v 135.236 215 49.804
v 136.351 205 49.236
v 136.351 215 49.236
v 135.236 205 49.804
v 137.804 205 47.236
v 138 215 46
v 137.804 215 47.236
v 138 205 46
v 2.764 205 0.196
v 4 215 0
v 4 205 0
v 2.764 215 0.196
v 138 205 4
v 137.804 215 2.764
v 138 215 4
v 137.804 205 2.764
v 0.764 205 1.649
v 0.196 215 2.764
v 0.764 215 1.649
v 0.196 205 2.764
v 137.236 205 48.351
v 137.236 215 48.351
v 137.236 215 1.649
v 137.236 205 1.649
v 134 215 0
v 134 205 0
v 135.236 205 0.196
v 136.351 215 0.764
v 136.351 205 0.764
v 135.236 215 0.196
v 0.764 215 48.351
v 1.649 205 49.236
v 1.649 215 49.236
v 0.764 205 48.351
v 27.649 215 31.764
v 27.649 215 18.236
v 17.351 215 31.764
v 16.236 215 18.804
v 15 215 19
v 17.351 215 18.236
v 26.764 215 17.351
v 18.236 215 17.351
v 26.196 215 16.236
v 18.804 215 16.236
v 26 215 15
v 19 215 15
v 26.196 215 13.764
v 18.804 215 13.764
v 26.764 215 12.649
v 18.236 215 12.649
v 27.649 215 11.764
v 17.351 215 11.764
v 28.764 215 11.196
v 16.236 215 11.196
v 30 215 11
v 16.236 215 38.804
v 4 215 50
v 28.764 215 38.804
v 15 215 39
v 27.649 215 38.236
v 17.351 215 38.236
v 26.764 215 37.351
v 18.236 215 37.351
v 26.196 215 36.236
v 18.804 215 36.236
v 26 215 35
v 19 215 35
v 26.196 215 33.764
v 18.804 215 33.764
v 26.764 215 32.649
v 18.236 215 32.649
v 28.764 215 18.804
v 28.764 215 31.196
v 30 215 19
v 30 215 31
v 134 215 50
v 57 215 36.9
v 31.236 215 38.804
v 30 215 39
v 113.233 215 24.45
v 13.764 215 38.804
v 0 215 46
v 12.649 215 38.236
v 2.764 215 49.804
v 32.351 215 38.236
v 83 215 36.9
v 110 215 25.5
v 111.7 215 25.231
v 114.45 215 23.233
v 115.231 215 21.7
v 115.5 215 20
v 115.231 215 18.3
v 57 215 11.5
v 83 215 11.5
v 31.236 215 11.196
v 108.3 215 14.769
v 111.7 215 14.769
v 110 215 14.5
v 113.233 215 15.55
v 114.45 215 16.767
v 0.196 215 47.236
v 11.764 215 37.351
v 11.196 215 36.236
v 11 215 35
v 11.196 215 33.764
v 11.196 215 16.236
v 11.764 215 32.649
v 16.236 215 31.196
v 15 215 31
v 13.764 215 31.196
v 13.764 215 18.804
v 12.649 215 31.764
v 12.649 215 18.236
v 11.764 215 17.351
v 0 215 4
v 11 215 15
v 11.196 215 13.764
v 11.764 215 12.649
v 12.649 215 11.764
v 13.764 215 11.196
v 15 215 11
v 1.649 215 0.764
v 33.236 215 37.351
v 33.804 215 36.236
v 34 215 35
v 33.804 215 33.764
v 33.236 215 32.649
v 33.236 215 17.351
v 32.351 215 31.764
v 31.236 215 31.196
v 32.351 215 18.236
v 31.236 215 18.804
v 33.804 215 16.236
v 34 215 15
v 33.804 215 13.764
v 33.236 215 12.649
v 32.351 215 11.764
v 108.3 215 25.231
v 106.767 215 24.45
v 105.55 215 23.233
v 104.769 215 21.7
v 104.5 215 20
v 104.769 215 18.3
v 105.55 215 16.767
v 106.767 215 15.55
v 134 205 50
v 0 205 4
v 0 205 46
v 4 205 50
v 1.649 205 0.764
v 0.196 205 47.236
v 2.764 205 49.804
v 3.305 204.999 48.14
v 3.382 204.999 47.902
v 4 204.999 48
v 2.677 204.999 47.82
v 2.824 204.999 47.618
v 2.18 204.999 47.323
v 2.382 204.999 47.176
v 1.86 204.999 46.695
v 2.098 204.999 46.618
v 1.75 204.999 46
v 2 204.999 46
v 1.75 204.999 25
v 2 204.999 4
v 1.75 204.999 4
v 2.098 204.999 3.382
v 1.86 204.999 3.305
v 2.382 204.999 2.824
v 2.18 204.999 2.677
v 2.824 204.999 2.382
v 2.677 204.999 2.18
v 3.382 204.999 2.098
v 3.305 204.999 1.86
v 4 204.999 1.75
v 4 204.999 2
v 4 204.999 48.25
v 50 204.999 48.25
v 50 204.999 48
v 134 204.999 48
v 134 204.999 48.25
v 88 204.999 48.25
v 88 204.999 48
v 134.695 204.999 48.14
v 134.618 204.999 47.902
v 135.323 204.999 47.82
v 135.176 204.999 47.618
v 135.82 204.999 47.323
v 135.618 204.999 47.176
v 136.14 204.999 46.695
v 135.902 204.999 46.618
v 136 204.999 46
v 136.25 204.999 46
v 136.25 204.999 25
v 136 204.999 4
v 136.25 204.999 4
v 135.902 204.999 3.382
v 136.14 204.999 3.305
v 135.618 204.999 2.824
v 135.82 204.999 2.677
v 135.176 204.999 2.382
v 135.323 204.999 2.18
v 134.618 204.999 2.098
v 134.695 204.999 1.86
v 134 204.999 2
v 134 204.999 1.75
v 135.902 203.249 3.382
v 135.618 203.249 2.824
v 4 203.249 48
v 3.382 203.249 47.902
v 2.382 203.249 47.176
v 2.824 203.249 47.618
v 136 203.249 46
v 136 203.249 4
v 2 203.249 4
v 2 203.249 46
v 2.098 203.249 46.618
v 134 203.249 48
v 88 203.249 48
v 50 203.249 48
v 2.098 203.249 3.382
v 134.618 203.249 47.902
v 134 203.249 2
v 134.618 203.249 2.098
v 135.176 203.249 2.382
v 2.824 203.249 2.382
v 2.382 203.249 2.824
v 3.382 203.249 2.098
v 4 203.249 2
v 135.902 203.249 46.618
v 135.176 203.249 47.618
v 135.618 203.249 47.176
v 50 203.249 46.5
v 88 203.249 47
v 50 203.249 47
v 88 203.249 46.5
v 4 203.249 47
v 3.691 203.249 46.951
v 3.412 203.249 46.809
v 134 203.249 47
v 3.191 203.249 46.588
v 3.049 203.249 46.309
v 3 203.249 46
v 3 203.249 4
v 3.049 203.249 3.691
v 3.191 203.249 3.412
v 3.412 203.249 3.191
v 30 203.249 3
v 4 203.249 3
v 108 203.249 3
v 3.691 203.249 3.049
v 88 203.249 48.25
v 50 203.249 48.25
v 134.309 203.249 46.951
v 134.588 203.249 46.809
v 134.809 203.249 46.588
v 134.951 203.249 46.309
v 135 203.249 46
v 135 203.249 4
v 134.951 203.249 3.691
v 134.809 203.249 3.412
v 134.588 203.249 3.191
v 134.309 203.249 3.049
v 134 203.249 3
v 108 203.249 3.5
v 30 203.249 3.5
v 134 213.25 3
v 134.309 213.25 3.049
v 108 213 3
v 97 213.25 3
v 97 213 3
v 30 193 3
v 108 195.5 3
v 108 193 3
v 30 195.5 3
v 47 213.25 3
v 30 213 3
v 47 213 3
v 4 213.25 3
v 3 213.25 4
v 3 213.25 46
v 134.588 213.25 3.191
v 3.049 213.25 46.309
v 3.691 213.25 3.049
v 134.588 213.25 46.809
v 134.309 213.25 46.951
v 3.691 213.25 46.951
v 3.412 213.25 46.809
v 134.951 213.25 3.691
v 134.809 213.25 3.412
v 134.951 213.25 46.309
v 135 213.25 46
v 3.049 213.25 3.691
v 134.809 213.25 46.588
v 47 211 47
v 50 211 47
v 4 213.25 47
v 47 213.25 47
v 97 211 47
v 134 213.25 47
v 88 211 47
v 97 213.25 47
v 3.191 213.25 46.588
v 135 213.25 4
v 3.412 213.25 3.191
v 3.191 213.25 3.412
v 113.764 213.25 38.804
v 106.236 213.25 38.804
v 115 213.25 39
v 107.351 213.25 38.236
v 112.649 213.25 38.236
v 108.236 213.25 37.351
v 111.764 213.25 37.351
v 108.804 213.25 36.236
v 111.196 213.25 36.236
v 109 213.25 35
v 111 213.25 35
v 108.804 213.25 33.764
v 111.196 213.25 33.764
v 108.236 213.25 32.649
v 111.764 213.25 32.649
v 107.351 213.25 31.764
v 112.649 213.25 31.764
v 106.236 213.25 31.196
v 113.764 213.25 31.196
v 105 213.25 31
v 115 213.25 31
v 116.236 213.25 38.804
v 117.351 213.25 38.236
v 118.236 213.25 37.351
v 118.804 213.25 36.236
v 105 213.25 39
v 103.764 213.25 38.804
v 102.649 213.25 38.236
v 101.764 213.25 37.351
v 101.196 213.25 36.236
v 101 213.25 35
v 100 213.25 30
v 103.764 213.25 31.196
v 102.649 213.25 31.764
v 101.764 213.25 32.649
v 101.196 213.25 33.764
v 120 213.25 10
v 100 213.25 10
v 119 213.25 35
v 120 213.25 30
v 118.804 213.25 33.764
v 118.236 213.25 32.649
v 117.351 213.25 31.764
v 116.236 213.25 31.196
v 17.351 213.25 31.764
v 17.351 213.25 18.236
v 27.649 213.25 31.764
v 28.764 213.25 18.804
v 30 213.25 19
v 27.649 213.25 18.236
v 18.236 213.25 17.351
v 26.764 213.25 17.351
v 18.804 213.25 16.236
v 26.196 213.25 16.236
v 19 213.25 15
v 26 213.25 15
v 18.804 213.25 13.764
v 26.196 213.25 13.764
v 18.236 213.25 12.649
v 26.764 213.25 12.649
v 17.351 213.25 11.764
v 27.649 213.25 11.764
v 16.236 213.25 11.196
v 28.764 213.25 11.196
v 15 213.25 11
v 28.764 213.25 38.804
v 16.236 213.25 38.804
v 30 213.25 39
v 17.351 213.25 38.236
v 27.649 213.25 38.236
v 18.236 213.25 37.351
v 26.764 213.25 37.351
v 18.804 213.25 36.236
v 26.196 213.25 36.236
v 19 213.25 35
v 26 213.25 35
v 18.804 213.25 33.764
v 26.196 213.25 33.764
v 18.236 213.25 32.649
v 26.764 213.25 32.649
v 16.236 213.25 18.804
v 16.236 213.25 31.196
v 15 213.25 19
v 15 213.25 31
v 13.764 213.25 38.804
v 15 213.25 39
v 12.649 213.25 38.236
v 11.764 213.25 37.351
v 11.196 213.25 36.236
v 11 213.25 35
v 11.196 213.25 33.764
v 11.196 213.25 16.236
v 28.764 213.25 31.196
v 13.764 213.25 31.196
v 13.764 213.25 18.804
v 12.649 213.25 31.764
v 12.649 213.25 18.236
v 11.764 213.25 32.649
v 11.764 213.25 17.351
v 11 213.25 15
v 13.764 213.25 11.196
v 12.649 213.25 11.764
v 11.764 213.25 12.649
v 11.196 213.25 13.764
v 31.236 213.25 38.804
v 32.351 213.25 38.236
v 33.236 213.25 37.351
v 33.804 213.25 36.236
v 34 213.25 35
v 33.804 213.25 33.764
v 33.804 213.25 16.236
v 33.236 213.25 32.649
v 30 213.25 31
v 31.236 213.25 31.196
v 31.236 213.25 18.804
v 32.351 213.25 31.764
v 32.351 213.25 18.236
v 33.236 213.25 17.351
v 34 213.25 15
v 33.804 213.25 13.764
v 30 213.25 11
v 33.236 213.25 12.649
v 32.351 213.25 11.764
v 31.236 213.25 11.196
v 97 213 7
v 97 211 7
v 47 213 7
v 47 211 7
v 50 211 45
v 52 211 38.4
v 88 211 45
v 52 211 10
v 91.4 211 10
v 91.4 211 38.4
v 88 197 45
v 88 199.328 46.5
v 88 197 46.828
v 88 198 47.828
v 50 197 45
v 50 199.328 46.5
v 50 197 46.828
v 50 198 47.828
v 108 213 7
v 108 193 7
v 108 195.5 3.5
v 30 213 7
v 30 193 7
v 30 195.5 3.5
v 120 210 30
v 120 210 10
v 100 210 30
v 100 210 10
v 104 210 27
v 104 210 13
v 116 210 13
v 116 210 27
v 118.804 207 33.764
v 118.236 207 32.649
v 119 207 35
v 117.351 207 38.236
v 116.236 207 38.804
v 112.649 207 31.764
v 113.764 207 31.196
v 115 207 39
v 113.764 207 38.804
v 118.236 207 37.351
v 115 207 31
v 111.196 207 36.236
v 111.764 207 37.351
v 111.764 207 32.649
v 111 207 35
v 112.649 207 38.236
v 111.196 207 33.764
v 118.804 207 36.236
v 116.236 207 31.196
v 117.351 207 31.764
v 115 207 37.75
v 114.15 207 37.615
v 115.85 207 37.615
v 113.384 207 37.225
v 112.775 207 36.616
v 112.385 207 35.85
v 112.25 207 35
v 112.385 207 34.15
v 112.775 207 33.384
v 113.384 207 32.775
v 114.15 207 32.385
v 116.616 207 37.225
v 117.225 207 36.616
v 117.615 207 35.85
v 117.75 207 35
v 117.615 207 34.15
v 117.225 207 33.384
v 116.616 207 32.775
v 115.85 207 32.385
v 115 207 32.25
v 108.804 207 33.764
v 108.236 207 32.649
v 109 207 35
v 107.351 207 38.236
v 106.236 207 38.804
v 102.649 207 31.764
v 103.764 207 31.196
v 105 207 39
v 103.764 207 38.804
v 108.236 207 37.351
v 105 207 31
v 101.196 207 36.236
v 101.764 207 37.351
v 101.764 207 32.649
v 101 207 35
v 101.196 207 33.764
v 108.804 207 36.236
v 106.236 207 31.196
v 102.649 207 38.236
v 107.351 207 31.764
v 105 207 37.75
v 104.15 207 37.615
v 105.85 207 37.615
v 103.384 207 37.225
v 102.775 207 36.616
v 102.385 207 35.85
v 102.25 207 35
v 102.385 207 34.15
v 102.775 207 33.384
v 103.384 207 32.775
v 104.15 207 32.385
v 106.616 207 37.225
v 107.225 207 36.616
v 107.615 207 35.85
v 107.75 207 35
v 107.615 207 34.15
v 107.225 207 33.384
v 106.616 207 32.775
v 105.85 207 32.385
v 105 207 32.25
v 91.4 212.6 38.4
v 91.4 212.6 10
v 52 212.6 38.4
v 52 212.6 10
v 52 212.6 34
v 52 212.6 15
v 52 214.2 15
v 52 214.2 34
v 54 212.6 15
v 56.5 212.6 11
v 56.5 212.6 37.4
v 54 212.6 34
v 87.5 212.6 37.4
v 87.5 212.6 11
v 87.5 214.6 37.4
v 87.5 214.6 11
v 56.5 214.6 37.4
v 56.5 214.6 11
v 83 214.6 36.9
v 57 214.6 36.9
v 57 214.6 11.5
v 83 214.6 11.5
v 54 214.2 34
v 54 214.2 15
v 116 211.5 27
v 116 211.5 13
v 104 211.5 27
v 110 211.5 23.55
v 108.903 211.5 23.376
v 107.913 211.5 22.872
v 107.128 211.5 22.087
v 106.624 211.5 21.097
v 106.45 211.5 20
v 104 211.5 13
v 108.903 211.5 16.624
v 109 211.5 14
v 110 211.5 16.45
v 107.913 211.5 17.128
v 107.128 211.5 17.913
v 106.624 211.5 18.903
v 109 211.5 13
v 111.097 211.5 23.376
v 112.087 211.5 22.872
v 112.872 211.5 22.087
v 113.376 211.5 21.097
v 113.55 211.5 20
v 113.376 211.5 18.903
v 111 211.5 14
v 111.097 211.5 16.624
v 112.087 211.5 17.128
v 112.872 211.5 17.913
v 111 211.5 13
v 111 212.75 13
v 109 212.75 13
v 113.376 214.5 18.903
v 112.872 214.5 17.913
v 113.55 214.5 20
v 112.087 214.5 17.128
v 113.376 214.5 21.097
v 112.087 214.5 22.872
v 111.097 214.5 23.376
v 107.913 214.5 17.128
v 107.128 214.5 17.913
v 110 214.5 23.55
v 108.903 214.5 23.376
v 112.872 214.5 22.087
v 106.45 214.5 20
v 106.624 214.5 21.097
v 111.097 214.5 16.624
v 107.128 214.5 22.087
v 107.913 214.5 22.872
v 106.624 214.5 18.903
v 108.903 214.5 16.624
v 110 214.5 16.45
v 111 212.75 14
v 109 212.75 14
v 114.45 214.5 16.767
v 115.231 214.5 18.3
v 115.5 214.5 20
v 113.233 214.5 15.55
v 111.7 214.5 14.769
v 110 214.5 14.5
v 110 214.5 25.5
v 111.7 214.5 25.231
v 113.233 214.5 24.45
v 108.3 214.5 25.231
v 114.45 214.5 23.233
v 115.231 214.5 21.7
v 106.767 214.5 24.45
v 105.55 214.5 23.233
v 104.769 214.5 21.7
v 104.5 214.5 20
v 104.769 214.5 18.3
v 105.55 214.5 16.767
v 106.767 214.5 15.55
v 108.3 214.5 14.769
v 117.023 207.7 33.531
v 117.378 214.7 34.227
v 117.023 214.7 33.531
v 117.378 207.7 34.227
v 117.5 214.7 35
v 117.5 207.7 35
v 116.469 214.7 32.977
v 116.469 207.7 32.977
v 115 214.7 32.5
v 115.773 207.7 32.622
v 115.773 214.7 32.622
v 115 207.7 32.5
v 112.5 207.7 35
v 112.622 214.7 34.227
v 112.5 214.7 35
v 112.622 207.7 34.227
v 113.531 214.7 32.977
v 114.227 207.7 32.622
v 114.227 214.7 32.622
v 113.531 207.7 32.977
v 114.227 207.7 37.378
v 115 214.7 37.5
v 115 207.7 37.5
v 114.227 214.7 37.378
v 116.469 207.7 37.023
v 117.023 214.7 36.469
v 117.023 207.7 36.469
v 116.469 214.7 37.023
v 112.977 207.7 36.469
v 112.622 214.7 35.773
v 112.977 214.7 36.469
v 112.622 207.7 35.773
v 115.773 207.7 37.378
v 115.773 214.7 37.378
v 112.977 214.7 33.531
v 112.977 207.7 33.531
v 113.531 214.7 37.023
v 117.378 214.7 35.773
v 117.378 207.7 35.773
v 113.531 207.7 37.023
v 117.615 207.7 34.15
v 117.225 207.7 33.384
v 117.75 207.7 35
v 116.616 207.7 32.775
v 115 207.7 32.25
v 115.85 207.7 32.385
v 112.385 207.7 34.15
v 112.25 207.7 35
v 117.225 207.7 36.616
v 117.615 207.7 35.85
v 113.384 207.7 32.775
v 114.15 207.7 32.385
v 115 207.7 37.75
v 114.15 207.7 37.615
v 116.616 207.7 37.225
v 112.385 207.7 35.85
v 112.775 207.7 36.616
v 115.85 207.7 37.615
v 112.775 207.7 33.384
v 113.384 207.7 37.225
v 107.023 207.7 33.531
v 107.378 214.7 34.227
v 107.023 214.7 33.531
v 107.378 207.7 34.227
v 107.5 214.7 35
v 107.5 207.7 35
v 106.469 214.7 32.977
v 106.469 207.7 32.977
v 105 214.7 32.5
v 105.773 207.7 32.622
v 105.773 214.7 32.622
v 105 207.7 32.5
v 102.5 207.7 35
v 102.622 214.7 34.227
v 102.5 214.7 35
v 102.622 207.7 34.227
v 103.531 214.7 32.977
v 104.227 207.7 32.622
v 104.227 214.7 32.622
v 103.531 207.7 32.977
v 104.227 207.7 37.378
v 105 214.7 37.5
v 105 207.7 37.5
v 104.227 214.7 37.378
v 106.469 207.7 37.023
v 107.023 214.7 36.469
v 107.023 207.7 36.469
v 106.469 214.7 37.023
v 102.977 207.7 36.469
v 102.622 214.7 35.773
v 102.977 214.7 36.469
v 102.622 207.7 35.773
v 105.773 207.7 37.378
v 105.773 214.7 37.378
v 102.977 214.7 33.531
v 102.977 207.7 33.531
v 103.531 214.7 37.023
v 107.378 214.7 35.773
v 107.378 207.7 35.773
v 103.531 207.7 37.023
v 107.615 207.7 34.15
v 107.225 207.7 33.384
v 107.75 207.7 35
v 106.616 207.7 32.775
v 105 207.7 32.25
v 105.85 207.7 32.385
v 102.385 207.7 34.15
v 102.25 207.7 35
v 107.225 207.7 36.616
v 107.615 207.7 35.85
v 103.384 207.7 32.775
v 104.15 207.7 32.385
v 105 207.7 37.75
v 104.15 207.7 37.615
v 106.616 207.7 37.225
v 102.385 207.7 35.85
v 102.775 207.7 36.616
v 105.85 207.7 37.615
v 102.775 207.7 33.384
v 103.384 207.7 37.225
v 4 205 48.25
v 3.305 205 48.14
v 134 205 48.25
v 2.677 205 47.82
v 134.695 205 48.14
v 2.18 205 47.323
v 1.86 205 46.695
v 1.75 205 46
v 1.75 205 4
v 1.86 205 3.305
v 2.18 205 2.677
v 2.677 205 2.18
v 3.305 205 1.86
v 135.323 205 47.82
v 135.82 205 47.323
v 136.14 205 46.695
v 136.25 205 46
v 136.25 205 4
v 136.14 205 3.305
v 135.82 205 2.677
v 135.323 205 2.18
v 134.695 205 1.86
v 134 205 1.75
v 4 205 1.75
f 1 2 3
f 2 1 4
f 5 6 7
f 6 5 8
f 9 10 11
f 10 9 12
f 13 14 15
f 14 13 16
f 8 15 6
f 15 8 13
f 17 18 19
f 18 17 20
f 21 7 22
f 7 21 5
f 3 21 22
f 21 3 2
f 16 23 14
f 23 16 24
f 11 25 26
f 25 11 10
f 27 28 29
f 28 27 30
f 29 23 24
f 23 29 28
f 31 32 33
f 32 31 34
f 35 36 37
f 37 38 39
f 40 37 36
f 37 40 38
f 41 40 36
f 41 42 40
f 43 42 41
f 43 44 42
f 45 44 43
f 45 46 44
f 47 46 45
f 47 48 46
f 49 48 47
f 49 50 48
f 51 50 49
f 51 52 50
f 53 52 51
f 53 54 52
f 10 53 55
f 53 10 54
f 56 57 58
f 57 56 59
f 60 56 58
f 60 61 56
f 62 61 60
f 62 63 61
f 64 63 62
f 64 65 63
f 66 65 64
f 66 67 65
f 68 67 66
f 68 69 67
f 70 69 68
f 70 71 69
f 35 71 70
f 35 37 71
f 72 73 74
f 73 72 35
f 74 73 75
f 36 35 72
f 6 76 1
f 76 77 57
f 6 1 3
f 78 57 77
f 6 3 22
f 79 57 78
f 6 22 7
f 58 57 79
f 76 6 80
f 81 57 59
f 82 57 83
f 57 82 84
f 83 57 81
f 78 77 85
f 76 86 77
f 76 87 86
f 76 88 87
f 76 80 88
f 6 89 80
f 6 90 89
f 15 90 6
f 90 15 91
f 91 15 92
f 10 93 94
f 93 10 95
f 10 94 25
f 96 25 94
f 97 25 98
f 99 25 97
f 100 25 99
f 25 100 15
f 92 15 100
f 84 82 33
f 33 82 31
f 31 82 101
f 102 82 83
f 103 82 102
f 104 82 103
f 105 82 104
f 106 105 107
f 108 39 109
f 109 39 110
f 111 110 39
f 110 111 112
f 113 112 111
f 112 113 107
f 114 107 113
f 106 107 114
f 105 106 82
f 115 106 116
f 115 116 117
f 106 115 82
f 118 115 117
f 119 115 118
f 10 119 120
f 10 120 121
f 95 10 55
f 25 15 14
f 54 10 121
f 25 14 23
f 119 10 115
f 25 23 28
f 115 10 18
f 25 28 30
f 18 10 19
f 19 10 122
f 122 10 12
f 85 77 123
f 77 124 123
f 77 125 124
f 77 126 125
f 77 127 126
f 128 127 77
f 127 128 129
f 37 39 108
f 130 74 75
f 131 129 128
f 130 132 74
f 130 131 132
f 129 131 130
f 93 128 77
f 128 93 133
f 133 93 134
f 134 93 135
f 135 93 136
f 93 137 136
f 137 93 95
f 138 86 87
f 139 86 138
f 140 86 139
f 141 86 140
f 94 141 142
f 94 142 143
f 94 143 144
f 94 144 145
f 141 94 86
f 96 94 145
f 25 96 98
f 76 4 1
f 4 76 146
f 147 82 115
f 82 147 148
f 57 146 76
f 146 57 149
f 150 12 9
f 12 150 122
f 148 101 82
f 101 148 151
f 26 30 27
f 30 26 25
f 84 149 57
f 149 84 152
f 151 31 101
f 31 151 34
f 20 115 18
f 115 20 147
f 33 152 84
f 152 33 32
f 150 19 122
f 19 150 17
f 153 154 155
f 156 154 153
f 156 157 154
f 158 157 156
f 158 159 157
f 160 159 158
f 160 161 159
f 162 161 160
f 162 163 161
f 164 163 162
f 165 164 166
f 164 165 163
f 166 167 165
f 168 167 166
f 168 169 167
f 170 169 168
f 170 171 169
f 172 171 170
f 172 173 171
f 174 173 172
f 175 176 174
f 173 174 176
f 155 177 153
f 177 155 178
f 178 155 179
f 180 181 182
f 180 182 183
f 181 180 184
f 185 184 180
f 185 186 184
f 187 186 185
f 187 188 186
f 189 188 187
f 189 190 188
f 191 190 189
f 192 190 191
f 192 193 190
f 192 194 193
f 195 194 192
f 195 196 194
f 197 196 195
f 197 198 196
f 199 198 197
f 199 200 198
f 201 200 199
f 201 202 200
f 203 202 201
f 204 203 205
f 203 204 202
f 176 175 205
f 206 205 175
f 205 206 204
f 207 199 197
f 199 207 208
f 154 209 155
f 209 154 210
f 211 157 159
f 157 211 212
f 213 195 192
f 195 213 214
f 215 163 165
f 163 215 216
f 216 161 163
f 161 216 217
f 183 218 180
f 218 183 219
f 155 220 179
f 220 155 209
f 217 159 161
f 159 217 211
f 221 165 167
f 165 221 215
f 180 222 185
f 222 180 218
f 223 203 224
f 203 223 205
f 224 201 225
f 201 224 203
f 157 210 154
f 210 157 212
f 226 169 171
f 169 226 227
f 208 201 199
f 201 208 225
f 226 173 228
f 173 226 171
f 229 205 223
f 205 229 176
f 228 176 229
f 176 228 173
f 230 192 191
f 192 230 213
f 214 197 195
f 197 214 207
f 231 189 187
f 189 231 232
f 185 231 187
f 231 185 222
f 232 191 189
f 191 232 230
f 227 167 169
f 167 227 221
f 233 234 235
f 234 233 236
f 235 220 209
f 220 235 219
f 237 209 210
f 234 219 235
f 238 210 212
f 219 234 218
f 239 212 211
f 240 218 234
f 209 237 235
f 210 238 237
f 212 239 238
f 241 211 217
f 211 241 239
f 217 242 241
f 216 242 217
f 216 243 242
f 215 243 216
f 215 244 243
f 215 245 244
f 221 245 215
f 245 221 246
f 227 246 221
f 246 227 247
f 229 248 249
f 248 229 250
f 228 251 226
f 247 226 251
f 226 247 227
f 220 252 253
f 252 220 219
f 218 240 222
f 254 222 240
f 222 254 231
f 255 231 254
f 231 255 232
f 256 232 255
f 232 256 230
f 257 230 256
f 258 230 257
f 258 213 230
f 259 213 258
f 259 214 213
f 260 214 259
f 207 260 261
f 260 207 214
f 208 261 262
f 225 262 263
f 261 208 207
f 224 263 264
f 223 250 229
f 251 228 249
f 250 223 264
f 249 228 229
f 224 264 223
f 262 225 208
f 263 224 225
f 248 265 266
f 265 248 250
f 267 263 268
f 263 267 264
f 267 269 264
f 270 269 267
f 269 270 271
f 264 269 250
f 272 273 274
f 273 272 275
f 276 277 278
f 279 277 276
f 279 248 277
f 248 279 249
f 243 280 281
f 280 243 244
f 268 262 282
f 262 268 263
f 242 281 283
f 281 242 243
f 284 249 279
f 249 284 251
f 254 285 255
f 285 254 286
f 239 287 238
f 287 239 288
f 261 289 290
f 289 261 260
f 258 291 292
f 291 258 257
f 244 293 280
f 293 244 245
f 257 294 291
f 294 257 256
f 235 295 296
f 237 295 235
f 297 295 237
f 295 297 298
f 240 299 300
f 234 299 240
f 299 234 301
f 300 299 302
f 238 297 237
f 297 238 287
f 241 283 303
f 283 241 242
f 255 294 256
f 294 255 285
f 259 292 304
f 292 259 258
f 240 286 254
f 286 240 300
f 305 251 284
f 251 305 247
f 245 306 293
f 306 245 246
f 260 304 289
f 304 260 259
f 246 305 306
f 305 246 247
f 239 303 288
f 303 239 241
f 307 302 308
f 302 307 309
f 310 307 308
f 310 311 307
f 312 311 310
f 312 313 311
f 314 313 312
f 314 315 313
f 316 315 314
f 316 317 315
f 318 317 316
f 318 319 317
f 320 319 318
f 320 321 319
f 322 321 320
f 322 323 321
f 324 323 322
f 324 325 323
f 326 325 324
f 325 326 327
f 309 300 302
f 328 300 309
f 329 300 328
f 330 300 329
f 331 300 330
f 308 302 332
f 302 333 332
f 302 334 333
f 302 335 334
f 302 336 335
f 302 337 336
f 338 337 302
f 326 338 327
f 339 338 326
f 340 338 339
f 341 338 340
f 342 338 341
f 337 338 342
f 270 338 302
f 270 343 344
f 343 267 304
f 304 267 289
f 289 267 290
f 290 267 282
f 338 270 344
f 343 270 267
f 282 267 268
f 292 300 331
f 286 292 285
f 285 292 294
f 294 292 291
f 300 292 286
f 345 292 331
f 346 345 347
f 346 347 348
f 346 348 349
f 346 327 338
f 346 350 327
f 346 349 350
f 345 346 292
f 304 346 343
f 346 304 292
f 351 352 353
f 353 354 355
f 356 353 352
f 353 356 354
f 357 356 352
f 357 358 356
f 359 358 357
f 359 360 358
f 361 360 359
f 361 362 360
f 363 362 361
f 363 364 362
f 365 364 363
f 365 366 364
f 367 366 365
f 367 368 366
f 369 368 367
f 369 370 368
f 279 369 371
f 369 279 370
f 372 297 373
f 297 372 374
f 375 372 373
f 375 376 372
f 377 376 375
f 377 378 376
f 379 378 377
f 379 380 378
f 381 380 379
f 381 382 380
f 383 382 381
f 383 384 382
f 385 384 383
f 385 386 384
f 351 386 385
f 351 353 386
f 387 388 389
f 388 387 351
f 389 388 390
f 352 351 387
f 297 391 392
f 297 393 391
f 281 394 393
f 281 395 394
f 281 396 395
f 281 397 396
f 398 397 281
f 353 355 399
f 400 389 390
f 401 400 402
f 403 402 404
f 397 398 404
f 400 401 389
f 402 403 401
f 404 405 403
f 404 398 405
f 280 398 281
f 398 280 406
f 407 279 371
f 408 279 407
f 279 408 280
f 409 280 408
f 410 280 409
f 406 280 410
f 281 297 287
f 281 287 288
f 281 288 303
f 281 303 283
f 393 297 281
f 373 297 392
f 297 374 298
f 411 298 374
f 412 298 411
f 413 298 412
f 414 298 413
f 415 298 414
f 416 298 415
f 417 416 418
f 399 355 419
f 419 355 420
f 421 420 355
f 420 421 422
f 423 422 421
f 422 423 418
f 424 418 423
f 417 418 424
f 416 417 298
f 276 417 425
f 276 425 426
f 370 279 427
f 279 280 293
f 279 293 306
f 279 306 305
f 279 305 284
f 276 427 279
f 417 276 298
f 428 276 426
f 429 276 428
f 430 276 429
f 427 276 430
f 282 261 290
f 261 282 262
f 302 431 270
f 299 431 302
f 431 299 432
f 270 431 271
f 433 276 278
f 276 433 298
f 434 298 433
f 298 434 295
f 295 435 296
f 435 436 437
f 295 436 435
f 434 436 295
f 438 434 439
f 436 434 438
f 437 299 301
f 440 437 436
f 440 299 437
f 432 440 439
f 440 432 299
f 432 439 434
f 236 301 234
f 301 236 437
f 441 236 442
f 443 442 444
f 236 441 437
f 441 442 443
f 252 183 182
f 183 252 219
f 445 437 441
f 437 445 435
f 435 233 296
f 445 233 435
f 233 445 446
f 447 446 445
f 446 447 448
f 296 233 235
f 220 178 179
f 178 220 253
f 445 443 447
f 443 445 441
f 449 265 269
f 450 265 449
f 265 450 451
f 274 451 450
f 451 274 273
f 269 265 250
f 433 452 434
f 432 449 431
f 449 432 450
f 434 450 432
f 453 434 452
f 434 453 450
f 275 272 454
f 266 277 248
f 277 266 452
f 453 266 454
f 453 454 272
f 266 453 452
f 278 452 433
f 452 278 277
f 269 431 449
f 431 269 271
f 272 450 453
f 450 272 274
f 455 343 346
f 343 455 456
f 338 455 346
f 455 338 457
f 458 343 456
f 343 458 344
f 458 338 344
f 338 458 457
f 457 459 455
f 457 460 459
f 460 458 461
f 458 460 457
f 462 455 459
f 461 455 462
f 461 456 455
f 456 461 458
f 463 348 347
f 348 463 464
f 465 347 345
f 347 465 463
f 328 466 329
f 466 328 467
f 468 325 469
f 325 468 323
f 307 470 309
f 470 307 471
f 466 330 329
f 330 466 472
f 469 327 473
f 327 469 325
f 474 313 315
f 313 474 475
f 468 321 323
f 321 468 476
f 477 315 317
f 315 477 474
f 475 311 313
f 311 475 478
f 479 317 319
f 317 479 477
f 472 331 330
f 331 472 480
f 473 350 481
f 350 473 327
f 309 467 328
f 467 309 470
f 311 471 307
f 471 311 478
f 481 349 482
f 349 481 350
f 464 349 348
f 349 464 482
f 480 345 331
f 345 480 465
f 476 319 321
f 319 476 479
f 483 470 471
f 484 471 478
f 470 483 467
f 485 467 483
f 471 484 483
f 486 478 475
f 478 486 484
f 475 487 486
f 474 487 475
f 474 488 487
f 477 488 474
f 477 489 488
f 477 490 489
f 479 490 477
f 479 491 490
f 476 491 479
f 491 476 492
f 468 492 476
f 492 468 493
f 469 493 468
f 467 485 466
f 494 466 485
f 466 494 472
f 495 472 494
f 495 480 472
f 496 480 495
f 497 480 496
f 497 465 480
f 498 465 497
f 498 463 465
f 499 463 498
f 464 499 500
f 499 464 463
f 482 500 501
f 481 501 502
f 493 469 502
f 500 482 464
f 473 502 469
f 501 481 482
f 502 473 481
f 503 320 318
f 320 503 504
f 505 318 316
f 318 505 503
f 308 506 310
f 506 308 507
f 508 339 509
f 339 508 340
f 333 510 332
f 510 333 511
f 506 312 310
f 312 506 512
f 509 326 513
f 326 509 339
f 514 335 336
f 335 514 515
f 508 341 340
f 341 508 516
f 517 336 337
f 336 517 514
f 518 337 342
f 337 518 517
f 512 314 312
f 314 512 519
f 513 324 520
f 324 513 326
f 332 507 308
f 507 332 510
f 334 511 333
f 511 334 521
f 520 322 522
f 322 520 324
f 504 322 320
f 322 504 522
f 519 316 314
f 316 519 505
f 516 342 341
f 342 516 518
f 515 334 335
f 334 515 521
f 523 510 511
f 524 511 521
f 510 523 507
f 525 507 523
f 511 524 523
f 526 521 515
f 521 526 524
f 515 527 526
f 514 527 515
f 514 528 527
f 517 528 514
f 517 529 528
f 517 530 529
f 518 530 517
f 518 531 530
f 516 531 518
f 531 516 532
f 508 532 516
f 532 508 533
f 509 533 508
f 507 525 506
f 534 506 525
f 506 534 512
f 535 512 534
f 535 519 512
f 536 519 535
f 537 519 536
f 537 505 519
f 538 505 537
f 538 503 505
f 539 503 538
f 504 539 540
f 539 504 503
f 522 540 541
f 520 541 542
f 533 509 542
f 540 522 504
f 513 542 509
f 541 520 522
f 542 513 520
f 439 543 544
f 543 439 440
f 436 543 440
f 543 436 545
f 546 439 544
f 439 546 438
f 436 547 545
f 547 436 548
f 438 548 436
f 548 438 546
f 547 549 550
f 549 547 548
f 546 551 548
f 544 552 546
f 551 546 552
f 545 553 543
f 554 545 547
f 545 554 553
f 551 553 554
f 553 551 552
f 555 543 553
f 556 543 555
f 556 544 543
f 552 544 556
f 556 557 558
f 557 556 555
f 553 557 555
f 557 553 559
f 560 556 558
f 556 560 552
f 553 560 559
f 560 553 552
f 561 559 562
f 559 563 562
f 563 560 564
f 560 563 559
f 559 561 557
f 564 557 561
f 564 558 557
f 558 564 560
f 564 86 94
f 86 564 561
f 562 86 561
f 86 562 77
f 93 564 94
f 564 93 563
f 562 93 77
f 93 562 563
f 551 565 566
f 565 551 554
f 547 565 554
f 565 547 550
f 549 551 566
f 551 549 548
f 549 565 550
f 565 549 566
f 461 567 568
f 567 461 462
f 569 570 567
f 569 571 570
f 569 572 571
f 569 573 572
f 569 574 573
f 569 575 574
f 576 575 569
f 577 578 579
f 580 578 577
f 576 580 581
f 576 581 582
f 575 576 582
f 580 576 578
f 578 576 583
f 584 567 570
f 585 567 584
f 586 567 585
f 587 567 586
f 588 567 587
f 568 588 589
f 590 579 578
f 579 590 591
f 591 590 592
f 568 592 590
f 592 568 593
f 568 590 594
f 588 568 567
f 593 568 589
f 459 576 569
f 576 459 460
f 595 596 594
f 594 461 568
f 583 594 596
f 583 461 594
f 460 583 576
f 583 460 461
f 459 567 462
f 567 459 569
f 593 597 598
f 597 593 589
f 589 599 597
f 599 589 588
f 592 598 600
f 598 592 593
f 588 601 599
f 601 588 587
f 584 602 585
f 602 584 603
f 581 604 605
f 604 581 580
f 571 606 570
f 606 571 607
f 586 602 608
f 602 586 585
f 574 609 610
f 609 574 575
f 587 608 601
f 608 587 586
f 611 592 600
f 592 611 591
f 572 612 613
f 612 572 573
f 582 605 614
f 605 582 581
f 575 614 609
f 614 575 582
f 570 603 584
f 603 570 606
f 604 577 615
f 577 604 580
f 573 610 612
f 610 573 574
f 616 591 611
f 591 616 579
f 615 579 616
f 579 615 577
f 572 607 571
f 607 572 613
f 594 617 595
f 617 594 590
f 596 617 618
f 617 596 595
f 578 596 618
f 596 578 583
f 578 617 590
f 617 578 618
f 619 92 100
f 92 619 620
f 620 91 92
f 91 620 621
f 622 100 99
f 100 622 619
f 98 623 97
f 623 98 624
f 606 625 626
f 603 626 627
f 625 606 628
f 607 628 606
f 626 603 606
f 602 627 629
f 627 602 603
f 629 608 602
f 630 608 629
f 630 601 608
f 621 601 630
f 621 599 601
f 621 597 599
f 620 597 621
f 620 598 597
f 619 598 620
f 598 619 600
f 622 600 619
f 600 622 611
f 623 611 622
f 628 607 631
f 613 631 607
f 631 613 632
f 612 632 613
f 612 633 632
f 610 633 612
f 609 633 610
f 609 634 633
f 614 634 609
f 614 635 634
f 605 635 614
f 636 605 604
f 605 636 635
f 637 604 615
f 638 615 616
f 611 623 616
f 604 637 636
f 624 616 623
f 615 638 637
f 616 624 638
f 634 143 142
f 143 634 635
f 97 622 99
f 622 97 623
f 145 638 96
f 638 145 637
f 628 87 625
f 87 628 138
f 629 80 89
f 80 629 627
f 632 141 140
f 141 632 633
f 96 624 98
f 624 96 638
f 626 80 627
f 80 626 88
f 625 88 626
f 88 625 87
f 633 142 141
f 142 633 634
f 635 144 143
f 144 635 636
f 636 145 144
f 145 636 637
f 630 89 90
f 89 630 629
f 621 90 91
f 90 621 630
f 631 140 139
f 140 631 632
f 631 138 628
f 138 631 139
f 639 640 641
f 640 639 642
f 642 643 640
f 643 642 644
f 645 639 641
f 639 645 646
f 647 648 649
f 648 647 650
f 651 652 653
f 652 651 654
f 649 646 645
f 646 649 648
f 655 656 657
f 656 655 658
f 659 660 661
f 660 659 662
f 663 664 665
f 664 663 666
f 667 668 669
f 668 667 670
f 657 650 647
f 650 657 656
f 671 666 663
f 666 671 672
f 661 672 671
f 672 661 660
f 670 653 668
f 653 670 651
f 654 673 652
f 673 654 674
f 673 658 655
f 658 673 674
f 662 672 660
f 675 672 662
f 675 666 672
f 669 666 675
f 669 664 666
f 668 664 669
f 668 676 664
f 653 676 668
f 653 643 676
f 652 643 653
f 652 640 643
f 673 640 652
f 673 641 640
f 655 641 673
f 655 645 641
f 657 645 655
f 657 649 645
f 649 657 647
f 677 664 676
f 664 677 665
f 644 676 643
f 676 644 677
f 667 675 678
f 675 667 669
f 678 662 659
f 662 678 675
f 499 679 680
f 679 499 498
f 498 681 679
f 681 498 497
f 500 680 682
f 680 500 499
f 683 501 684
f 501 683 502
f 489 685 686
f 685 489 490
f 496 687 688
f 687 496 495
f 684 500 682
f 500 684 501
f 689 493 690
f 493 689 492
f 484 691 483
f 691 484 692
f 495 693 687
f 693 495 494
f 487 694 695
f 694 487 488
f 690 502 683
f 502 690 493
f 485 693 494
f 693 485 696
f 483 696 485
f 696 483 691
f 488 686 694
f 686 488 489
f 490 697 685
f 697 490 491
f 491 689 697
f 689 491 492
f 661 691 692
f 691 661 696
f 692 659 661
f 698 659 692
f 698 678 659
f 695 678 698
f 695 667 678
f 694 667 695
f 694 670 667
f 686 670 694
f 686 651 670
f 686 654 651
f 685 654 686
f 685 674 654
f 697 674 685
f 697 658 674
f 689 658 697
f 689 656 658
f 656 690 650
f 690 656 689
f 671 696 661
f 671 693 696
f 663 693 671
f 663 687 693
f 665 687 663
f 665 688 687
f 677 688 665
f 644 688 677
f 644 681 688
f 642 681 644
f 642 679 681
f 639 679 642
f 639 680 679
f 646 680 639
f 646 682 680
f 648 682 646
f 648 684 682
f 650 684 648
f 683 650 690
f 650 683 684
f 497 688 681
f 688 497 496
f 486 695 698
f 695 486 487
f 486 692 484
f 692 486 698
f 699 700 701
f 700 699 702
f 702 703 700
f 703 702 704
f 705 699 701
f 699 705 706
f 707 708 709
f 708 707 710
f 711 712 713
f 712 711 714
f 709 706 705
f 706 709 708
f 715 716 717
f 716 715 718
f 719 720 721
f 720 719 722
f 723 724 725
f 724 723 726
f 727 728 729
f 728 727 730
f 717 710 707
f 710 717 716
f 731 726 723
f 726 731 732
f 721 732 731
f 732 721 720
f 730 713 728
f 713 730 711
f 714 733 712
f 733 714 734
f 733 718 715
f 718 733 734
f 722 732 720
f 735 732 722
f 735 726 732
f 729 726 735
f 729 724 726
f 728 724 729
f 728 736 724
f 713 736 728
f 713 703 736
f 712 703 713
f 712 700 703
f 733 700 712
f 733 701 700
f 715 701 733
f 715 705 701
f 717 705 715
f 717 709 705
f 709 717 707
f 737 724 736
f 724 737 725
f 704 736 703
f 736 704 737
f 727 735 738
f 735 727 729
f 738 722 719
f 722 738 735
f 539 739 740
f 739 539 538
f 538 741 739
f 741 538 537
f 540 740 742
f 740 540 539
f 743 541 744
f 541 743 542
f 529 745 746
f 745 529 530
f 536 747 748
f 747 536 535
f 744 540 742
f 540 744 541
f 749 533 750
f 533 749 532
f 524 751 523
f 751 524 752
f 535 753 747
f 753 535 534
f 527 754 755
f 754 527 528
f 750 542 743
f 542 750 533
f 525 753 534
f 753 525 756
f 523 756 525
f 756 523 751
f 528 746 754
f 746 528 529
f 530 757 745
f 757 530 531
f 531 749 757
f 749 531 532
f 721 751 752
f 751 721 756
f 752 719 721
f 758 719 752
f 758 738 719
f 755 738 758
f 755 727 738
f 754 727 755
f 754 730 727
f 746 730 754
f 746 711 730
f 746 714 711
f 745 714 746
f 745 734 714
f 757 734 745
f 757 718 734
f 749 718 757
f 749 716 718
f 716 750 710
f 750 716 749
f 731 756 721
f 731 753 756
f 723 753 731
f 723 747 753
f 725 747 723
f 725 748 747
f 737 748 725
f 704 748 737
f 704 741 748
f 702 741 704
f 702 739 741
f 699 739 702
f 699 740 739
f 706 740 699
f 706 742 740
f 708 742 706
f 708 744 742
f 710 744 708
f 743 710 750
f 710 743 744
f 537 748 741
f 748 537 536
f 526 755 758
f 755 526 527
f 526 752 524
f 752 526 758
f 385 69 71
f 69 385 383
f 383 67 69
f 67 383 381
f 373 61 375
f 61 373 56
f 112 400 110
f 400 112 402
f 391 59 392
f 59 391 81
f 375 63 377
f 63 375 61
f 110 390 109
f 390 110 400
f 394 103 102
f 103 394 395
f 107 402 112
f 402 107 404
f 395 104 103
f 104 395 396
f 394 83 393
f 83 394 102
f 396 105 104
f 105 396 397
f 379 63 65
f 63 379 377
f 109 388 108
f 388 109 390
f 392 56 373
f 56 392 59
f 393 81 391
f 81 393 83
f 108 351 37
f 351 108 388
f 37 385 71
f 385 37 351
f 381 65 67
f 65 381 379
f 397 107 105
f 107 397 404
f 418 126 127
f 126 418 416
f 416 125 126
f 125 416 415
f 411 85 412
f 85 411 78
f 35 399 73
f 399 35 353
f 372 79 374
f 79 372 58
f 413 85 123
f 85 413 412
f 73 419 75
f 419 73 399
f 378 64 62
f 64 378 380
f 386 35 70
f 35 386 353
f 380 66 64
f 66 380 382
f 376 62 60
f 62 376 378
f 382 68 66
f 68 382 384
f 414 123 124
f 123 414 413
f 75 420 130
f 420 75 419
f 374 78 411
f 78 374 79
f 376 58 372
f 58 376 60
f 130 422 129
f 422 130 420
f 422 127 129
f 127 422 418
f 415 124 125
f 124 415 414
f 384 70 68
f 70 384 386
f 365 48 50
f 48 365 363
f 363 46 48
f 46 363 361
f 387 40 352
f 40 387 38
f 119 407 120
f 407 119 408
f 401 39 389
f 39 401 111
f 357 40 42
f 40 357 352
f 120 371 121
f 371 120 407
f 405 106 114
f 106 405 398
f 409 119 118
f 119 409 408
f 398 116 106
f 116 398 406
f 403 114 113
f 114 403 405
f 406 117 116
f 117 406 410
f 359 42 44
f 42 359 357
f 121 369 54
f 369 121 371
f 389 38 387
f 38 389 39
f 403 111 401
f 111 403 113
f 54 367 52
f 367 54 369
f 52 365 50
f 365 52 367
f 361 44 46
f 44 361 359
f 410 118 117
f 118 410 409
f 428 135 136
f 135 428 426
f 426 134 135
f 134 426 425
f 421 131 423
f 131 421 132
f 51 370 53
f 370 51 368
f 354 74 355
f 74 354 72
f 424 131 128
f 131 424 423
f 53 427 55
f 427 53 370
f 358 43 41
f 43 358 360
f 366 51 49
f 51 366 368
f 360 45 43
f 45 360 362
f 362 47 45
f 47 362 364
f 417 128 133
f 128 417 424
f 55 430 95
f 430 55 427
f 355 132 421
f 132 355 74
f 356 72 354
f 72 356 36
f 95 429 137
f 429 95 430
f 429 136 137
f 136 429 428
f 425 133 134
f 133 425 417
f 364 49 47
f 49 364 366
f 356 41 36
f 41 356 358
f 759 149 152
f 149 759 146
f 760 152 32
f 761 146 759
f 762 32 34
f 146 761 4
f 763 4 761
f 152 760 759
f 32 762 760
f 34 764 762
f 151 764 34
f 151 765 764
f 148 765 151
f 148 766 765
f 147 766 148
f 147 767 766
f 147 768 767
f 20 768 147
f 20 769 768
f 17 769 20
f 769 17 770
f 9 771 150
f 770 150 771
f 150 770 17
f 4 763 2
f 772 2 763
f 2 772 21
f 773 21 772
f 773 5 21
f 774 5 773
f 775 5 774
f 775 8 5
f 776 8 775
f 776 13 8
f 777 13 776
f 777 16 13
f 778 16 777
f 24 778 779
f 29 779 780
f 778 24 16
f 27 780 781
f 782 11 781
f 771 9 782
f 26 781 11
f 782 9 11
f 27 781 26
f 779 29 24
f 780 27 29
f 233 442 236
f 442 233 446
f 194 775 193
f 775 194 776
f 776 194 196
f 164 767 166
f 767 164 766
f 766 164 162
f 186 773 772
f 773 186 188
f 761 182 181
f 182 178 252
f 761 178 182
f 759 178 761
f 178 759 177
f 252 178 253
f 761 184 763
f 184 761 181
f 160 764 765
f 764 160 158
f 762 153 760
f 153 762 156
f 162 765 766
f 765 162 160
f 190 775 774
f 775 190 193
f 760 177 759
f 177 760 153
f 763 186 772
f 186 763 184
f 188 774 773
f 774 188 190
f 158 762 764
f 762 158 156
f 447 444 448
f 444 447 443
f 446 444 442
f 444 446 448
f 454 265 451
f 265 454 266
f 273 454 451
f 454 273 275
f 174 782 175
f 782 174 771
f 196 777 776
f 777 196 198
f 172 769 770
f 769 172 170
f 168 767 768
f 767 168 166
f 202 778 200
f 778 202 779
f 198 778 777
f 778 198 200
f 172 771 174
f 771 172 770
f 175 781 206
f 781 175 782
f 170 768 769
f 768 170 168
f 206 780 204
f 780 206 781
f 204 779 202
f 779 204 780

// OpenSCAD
// file: PiHoles.scad
//Shut your Pi Hole!
//An OpenSCAD library to assist with designing Raspberry Pi accessories

//This work is licensed under the Creative Commons Attribution-ShareAlike 4.0 International License. To view a copy of this license, visit http://creativecommons.org/licenses/by-sa/4.0/.
//© 2016 Dale Price

//Pi dimensions sourced from https://www.raspberrypi.org/documentation/hardware/raspberrypi/mechanical/
//Currently supports "1B", "1A+", "1B+", "2B", "3B", "Zero"

//get vector of [x,y] vectors of locations of mounting holes based on Pi version
function piHoleLocations (board="3B") =
	(board=="1A+" || board=="1B+" || board=="2B" || board=="3A+" || board=="3B") ?
		[[3.5, 3.5], [61.5, 3.5], [3.5, 52.5], [61.5, 52.5]] : //pi 1B+, 2B, 3B
	(board=="Zero") ?
		[[3.5, 3.5], [61.5, 3.5], [3.5, 26.5], [61.5, 26.5]] : //pi zero
	(board=="1B") ?
		[[80, 43.5], [25, 17.5]] :
	[]; //invalid board

//get vector of [x,y,z] dimensions of board
//	dimensions are for PCB only, not ports or anything else
function piBoardDim (board="3B") =
	(board=="1B" || board=="1B+" || board=="2B" || board=="3B") ?
		[85, 56, 1.25] :
	(board=="Zero") ?
		[65, 30, 1.25] :
	(board == "1A+" || board=="3A+") ?
		[65, 56, 1.25] :
	[0,0,0];

//Mounting holes for a Raspberry Pi of the specified version
//	Parameters
//		board: the version of the raspberry pi to generate holes for
//		depth: the depth of the holes in mm
module piHoles (board, depth = 5, preview=true) {
	hd = 2.8; //radius of pi mounting holes plus a tiny bit extra to account for shrinkage when 3D printing
	hr = hd/2;

	//preview of the board itself
	if(preview==true)
		% piBoard(board);

	//mounting holes
	for(holePos = piHoleLocations(board)) {
		translate([holePos[0], holePos[1], -depth]) cylinder(d=hd, h=depth);
	}
}

//Preview of board dimensions for Raspberry Pi of the specified version
module piBoard (board) {
	difference() {
		cube(piBoardDim(board), center=false);
		translate([0,0,piBoardDim(board)[2] + 0.01]) piHoles(board, piBoardDim(board)[2] + 0.02, false);
	}

	//warn about possible inaccuracy of boards that don't currently have official documentation
	if(board == "1B") {
		echo("CAUTION: The mounting hole positions for the board you have selected may not be accurate because the Raspberry Pi Foundation does not currently provide official mechanical drawings for it.");
	}
}

//Snap-fit posts for mounting the Raspberry Pi
//	Parameters
//		board: version of the raspberry pi to mount
//		height: height of the top surface of the raspberry pi board off the base of the posts
//		preview: whether or not to show a preview of the board in place
module piPosts(board, height=5, preview=true) {
	piSize = piBoardDim(board);
	piHolePos = piHoleLocations(board);

	module pcbPost(height) {
		cylinder(d1=10, d2=5, h=height - piSize[2] - 0.25);
	}

	for(holePos = piHolePos) {
		translate([holePos[0], holePos[1], 0]) pcbPost(height);
	}

	if(preview==true)
		% translate([0,0,height-piSize[2]]) piBoard(board);
}
// main file
include <PiHoles.scad>;

$fn=20;

facePi1541();
//lidPi1541();
//basePi1541();



module screwpost() {
    difference() {
        union() {
            translate([0,-5,0]) cube([10,10,50]);
            cylinder(d=10,h=50);
        }
        cylinder(d=2.5,h=50);
    }
}

regPos=[95,20,-10];


module basePi1541() {   
    difference() {
        union() {
            roundedBoxBottom();
            translate([10,0,-12]) cube([57,8,36]);
            translate([2,0,2]) cube([57,8,36-14]);
            translate([80,20,-10]) rotate([0,0,90]) piPosts("3B",9,false); 
            
            translate(regPos) { 
                translate([3,6,0]) cylinder(d1=10, d2=5, h=10);
                translate([18,37,0]) cylinder(d1=10, d2=5, h=10);
            }
        }
        translate([35,3.5,0]) rotate([90,0,180]) ieccut();
        translate([35+25,3.5,0]) rotate([90,0,180]) ieccut();
        translate([90,-5,15]) rotate([-90,0,0]) cylinder(d=6,h=20);
        translate([110,-5,15]) rotate([-90,0,0]) cylinder(d=8,h=20);
        translate([90-8.5/2,3,8]) cube([8.5,10,14]);
        translate([80,20,0]) rotate([0,0,90]) piHoles("3B",9,false);
        translate(regPos) { 
            translate([3,6,0]) cylinder(d=2.5, h=20);
            translate([18,37,0]) cylinder(d=2.5, h=20);
        }
    }
}

module lidPi1541() {
    roundedBoxTop();

}

module facePi1541() {
    difference() {
        translate([0,205,0]) difference() {
            union() {
                roundedBoxFace();
                translate([47,6,0]) cube([50,4,50]);
                translate([50,-8,45]) cube([38,15,4]);
                translate([30,-12,3]) cube([78,20,4]);
                translate([110,7,20]) cube([20,4,20],center=true);
                translate([115,2,35]) rotate([-90,0,0]) cylinder(d=8,h=8);
                translate([105,2,35]) rotate([-90,0,0]) cylinder(d=8,h=8);
            }
            translate([52,6,10]) spiLCD();
            translate([110,3,20]) rotate([-90,0,0]) rotaryEncoder();
            translate([115,1.7,35]) rotate([-90,0,0]) LED();
            translate([105,1.7,35]) rotate([-90,0,0]) LED();
            translate([15,2,35]) rotate([-90,0,0]) cylinder(d=8,h=18);
            translate([30,2,35]) rotate([-90,0,0]) cylinder(d=8,h=18);
            translate([15,2,15]) rotate([-90,0,0]) cylinder(d=8,h=18);
            translate([30,2,15]) rotate([-90,0,0]) cylinder(d=8,h=18);

        }
        lidPi1541();
        basePi1541();
    }
}

module LED() {
    cylinder(d=5,h=8);
    cylinder(d=5.5,h=1);
}

module spiLCD() {    
    cube([39.4,1.6,28.4]);
    translate([4.5,1.6,1]) cube([31,2,26.4]);
    translate([5,1.6+2,1.5]) cube([26,12,25.4]);
    translate([0,1.6,5]) cube([2,1.6,19]);
}

module rotaryEncoder() {
    cube([12,14,7],center=true);
    cylinder(d=7.1,h=20);
    translate([0,7-0.5,7/2+0.5]) cube([2,1,1.5],center=true);
    translate([0,0,7/2+3]) cylinder(d=11,h=20);
}


module roundedBoxFace(d=8,s=[138,205,50],w=7) {

    difference() {
        union() {
            translate([d/2,0,d/2]) minkowski() {
                cube([s[0]-d,10,s[2]-d]);
                rotate([90,0,0]) cylinder(d=d,h=0.001);
            }
            translate([d/2,-w/4,d/2]) minkowski() {
                cube([s[0]-d,10,s[2]-d]);
                rotate([90,0,0]) cylinder(d=d/2,h=0.001);
            }
        }
        translate([d/2,-w/4,d/2]) minkowski() {
            cube([s[0]-d,10,s[2]-d]);
            rotate([90,0,0]) cylinder(d=d/4,h=0.001);
        }
    }
}


module roundedBoxTop(d=8,s=[138,205,50],w=7) {

    difference() {
        translate([d/2,0,d/2]) minkowski() {
            cube([s[0]-d,s[1],s[2]-d]);
            rotate([90,0,0]) cylinder(d=d,h=0.001);
        }
        translate([d/2,w/2+10,d/2]) minkowski() {
            cube([s[0]-d,s[1],s[2]-d]);
            rotate([90,0,0]) cylinder(d=d-w,h=10);
        }
        translate([0,-1,0]) cube([s[0]+20+d,s[1]+20+d,s[2]/2]);
        translate([w/4,w/4,s[2]/2-2]) cube([s[0]-w/2,s[1],4]);
        for (i=[0:6:80]) {
            translate([-0.1,40+i,s[2]/2+d/2]) cube([s[0]+10,2,(s[2]/2)-d]);
        }
        translate([d/2,s[1]-w/4,d/2]) minkowski() {
            cube([s[0]-d,10,s[2]-d]);
            rotate([90,0,0]) cylinder(d=d-w/2,h=0.001);
        }
        translate([138/2,198,45]) rotate([45,0,0]) cube([40,4,4],center=true);

    }
    difference() {
        intersection() {
            union() {
                translate([128,20,25]) screwpost();
                translate([128,180,25]) screwpost();
                translate([10,20,25]) rotate([0,0,180]) screwpost();
                translate([10,180,25]) rotate([0,0,180]) screwpost();
            }
            translate([d/2,0,d/2]) minkowski() {
                cube([s[0]-d,s[1],s[2]-d]);
                rotate([90,0,0]) cylinder(d=d,h=0.001);
            }
        }
        roundedBoxBottom();
    }
}

module roundedBoxBottom(d=8,s=[138,205,50],w=7) {
    difference() {
        union() {
            difference() {
                union() {
                    intersection() {
                        translate([d/2,0,d/2]) minkowski() {
                            cube([s[0]-d,s[1],s[2]-d]);
                            rotate([90,0,0]) cylinder(d=d,h=0.001);
                        }
                        translate([0,-1,0]) cube([s[0]+20+d,s[1]+20+d,s[2]/2]);
                    }
                    base();
                    translate([w/4,w/4,s[2]/2-2]) cube([s[0]-w/2,s[1]-w/2,4]);
              
                }
                translate([d/2,w/2+10,d/2]) minkowski() {
                    cube([s[0]-d,s[1],s[2]-d]);
                    rotate([90,0,0]) cylinder(d=d-w,h=10);
                }
                translate([10,w/2,-10]) cube([130-12,205-8-5,50]);
                for (i=[0:6:80]) {
                    translate([d-4,40+i,-8]) cube([s[0]-d,2,s[2]-d]);
                }
                translate([d/2,s[1]-w/4,d/2]) minkowski() {
                    cube([s[0]-d,10,s[2]-d]);
                    rotate([90,0,0]) cylinder(d=d-w/2,h=0.001);
                }
            }
            
            intersection() {
                union() {
                    translate([128,20,-25]) screwpost();
                    translate([128,180,-25]) screwpost();
                    translate([10,20,-25]) rotate([0,0,180]) screwpost();
                    translate([10,180,-25]) rotate([0,0,180]) screwpost();
                }
                union() {
                    intersection() {
                        translate([d/2,0,d/2]) minkowski() {
                            cube([s[0]-d,s[1],s[2]-d]);
                            rotate([90,0,0]) cylinder(d=d,h=0.001);
                        }
                        translate([0,-1,0]) cube([s[0]+20+d,s[1]+20+d,s[2]/2]);
                    }
                    base();
                    translate([w/4,w/4,s[2]/2-2]) cube([s[0]-w/2,s[1]-w/2,4]);
              
                }
            }    
        }
        translate([128,20,-25]) screwGuide();
        translate([128,180,-25]) screwGuide();
        translate([10,20,-25]) screwGuide();
        translate([10,180,-25]) screwGuide();
    }
}

module screwGuide() {
    cylinder(d=3.3,h=100);
    cylinder(d=5.5,h=48);
}

module base() {
    translate([134,205,-12]) rotate([0,0,180]) difference() {
        cube([130,205,12]);
        translate([-1,-13,-10]) rotate([20,0,0]) cube([140,20,20]);
        translate([130-3,-14,-10]) rotate([0,6,0]) cube([20,225,40]);
        translate([-20+3,-14,-10]) rotate([0,-6,0]) cube([20,225,40]);
    }
}

module ieccut() {
    cube([21.3,60,1.8]);
    translate([1,1,0]) cube([21.2-2,60,30]);
    translate([21.2/2,19/2,-28]) cylinder(d=18,h=30);
}
